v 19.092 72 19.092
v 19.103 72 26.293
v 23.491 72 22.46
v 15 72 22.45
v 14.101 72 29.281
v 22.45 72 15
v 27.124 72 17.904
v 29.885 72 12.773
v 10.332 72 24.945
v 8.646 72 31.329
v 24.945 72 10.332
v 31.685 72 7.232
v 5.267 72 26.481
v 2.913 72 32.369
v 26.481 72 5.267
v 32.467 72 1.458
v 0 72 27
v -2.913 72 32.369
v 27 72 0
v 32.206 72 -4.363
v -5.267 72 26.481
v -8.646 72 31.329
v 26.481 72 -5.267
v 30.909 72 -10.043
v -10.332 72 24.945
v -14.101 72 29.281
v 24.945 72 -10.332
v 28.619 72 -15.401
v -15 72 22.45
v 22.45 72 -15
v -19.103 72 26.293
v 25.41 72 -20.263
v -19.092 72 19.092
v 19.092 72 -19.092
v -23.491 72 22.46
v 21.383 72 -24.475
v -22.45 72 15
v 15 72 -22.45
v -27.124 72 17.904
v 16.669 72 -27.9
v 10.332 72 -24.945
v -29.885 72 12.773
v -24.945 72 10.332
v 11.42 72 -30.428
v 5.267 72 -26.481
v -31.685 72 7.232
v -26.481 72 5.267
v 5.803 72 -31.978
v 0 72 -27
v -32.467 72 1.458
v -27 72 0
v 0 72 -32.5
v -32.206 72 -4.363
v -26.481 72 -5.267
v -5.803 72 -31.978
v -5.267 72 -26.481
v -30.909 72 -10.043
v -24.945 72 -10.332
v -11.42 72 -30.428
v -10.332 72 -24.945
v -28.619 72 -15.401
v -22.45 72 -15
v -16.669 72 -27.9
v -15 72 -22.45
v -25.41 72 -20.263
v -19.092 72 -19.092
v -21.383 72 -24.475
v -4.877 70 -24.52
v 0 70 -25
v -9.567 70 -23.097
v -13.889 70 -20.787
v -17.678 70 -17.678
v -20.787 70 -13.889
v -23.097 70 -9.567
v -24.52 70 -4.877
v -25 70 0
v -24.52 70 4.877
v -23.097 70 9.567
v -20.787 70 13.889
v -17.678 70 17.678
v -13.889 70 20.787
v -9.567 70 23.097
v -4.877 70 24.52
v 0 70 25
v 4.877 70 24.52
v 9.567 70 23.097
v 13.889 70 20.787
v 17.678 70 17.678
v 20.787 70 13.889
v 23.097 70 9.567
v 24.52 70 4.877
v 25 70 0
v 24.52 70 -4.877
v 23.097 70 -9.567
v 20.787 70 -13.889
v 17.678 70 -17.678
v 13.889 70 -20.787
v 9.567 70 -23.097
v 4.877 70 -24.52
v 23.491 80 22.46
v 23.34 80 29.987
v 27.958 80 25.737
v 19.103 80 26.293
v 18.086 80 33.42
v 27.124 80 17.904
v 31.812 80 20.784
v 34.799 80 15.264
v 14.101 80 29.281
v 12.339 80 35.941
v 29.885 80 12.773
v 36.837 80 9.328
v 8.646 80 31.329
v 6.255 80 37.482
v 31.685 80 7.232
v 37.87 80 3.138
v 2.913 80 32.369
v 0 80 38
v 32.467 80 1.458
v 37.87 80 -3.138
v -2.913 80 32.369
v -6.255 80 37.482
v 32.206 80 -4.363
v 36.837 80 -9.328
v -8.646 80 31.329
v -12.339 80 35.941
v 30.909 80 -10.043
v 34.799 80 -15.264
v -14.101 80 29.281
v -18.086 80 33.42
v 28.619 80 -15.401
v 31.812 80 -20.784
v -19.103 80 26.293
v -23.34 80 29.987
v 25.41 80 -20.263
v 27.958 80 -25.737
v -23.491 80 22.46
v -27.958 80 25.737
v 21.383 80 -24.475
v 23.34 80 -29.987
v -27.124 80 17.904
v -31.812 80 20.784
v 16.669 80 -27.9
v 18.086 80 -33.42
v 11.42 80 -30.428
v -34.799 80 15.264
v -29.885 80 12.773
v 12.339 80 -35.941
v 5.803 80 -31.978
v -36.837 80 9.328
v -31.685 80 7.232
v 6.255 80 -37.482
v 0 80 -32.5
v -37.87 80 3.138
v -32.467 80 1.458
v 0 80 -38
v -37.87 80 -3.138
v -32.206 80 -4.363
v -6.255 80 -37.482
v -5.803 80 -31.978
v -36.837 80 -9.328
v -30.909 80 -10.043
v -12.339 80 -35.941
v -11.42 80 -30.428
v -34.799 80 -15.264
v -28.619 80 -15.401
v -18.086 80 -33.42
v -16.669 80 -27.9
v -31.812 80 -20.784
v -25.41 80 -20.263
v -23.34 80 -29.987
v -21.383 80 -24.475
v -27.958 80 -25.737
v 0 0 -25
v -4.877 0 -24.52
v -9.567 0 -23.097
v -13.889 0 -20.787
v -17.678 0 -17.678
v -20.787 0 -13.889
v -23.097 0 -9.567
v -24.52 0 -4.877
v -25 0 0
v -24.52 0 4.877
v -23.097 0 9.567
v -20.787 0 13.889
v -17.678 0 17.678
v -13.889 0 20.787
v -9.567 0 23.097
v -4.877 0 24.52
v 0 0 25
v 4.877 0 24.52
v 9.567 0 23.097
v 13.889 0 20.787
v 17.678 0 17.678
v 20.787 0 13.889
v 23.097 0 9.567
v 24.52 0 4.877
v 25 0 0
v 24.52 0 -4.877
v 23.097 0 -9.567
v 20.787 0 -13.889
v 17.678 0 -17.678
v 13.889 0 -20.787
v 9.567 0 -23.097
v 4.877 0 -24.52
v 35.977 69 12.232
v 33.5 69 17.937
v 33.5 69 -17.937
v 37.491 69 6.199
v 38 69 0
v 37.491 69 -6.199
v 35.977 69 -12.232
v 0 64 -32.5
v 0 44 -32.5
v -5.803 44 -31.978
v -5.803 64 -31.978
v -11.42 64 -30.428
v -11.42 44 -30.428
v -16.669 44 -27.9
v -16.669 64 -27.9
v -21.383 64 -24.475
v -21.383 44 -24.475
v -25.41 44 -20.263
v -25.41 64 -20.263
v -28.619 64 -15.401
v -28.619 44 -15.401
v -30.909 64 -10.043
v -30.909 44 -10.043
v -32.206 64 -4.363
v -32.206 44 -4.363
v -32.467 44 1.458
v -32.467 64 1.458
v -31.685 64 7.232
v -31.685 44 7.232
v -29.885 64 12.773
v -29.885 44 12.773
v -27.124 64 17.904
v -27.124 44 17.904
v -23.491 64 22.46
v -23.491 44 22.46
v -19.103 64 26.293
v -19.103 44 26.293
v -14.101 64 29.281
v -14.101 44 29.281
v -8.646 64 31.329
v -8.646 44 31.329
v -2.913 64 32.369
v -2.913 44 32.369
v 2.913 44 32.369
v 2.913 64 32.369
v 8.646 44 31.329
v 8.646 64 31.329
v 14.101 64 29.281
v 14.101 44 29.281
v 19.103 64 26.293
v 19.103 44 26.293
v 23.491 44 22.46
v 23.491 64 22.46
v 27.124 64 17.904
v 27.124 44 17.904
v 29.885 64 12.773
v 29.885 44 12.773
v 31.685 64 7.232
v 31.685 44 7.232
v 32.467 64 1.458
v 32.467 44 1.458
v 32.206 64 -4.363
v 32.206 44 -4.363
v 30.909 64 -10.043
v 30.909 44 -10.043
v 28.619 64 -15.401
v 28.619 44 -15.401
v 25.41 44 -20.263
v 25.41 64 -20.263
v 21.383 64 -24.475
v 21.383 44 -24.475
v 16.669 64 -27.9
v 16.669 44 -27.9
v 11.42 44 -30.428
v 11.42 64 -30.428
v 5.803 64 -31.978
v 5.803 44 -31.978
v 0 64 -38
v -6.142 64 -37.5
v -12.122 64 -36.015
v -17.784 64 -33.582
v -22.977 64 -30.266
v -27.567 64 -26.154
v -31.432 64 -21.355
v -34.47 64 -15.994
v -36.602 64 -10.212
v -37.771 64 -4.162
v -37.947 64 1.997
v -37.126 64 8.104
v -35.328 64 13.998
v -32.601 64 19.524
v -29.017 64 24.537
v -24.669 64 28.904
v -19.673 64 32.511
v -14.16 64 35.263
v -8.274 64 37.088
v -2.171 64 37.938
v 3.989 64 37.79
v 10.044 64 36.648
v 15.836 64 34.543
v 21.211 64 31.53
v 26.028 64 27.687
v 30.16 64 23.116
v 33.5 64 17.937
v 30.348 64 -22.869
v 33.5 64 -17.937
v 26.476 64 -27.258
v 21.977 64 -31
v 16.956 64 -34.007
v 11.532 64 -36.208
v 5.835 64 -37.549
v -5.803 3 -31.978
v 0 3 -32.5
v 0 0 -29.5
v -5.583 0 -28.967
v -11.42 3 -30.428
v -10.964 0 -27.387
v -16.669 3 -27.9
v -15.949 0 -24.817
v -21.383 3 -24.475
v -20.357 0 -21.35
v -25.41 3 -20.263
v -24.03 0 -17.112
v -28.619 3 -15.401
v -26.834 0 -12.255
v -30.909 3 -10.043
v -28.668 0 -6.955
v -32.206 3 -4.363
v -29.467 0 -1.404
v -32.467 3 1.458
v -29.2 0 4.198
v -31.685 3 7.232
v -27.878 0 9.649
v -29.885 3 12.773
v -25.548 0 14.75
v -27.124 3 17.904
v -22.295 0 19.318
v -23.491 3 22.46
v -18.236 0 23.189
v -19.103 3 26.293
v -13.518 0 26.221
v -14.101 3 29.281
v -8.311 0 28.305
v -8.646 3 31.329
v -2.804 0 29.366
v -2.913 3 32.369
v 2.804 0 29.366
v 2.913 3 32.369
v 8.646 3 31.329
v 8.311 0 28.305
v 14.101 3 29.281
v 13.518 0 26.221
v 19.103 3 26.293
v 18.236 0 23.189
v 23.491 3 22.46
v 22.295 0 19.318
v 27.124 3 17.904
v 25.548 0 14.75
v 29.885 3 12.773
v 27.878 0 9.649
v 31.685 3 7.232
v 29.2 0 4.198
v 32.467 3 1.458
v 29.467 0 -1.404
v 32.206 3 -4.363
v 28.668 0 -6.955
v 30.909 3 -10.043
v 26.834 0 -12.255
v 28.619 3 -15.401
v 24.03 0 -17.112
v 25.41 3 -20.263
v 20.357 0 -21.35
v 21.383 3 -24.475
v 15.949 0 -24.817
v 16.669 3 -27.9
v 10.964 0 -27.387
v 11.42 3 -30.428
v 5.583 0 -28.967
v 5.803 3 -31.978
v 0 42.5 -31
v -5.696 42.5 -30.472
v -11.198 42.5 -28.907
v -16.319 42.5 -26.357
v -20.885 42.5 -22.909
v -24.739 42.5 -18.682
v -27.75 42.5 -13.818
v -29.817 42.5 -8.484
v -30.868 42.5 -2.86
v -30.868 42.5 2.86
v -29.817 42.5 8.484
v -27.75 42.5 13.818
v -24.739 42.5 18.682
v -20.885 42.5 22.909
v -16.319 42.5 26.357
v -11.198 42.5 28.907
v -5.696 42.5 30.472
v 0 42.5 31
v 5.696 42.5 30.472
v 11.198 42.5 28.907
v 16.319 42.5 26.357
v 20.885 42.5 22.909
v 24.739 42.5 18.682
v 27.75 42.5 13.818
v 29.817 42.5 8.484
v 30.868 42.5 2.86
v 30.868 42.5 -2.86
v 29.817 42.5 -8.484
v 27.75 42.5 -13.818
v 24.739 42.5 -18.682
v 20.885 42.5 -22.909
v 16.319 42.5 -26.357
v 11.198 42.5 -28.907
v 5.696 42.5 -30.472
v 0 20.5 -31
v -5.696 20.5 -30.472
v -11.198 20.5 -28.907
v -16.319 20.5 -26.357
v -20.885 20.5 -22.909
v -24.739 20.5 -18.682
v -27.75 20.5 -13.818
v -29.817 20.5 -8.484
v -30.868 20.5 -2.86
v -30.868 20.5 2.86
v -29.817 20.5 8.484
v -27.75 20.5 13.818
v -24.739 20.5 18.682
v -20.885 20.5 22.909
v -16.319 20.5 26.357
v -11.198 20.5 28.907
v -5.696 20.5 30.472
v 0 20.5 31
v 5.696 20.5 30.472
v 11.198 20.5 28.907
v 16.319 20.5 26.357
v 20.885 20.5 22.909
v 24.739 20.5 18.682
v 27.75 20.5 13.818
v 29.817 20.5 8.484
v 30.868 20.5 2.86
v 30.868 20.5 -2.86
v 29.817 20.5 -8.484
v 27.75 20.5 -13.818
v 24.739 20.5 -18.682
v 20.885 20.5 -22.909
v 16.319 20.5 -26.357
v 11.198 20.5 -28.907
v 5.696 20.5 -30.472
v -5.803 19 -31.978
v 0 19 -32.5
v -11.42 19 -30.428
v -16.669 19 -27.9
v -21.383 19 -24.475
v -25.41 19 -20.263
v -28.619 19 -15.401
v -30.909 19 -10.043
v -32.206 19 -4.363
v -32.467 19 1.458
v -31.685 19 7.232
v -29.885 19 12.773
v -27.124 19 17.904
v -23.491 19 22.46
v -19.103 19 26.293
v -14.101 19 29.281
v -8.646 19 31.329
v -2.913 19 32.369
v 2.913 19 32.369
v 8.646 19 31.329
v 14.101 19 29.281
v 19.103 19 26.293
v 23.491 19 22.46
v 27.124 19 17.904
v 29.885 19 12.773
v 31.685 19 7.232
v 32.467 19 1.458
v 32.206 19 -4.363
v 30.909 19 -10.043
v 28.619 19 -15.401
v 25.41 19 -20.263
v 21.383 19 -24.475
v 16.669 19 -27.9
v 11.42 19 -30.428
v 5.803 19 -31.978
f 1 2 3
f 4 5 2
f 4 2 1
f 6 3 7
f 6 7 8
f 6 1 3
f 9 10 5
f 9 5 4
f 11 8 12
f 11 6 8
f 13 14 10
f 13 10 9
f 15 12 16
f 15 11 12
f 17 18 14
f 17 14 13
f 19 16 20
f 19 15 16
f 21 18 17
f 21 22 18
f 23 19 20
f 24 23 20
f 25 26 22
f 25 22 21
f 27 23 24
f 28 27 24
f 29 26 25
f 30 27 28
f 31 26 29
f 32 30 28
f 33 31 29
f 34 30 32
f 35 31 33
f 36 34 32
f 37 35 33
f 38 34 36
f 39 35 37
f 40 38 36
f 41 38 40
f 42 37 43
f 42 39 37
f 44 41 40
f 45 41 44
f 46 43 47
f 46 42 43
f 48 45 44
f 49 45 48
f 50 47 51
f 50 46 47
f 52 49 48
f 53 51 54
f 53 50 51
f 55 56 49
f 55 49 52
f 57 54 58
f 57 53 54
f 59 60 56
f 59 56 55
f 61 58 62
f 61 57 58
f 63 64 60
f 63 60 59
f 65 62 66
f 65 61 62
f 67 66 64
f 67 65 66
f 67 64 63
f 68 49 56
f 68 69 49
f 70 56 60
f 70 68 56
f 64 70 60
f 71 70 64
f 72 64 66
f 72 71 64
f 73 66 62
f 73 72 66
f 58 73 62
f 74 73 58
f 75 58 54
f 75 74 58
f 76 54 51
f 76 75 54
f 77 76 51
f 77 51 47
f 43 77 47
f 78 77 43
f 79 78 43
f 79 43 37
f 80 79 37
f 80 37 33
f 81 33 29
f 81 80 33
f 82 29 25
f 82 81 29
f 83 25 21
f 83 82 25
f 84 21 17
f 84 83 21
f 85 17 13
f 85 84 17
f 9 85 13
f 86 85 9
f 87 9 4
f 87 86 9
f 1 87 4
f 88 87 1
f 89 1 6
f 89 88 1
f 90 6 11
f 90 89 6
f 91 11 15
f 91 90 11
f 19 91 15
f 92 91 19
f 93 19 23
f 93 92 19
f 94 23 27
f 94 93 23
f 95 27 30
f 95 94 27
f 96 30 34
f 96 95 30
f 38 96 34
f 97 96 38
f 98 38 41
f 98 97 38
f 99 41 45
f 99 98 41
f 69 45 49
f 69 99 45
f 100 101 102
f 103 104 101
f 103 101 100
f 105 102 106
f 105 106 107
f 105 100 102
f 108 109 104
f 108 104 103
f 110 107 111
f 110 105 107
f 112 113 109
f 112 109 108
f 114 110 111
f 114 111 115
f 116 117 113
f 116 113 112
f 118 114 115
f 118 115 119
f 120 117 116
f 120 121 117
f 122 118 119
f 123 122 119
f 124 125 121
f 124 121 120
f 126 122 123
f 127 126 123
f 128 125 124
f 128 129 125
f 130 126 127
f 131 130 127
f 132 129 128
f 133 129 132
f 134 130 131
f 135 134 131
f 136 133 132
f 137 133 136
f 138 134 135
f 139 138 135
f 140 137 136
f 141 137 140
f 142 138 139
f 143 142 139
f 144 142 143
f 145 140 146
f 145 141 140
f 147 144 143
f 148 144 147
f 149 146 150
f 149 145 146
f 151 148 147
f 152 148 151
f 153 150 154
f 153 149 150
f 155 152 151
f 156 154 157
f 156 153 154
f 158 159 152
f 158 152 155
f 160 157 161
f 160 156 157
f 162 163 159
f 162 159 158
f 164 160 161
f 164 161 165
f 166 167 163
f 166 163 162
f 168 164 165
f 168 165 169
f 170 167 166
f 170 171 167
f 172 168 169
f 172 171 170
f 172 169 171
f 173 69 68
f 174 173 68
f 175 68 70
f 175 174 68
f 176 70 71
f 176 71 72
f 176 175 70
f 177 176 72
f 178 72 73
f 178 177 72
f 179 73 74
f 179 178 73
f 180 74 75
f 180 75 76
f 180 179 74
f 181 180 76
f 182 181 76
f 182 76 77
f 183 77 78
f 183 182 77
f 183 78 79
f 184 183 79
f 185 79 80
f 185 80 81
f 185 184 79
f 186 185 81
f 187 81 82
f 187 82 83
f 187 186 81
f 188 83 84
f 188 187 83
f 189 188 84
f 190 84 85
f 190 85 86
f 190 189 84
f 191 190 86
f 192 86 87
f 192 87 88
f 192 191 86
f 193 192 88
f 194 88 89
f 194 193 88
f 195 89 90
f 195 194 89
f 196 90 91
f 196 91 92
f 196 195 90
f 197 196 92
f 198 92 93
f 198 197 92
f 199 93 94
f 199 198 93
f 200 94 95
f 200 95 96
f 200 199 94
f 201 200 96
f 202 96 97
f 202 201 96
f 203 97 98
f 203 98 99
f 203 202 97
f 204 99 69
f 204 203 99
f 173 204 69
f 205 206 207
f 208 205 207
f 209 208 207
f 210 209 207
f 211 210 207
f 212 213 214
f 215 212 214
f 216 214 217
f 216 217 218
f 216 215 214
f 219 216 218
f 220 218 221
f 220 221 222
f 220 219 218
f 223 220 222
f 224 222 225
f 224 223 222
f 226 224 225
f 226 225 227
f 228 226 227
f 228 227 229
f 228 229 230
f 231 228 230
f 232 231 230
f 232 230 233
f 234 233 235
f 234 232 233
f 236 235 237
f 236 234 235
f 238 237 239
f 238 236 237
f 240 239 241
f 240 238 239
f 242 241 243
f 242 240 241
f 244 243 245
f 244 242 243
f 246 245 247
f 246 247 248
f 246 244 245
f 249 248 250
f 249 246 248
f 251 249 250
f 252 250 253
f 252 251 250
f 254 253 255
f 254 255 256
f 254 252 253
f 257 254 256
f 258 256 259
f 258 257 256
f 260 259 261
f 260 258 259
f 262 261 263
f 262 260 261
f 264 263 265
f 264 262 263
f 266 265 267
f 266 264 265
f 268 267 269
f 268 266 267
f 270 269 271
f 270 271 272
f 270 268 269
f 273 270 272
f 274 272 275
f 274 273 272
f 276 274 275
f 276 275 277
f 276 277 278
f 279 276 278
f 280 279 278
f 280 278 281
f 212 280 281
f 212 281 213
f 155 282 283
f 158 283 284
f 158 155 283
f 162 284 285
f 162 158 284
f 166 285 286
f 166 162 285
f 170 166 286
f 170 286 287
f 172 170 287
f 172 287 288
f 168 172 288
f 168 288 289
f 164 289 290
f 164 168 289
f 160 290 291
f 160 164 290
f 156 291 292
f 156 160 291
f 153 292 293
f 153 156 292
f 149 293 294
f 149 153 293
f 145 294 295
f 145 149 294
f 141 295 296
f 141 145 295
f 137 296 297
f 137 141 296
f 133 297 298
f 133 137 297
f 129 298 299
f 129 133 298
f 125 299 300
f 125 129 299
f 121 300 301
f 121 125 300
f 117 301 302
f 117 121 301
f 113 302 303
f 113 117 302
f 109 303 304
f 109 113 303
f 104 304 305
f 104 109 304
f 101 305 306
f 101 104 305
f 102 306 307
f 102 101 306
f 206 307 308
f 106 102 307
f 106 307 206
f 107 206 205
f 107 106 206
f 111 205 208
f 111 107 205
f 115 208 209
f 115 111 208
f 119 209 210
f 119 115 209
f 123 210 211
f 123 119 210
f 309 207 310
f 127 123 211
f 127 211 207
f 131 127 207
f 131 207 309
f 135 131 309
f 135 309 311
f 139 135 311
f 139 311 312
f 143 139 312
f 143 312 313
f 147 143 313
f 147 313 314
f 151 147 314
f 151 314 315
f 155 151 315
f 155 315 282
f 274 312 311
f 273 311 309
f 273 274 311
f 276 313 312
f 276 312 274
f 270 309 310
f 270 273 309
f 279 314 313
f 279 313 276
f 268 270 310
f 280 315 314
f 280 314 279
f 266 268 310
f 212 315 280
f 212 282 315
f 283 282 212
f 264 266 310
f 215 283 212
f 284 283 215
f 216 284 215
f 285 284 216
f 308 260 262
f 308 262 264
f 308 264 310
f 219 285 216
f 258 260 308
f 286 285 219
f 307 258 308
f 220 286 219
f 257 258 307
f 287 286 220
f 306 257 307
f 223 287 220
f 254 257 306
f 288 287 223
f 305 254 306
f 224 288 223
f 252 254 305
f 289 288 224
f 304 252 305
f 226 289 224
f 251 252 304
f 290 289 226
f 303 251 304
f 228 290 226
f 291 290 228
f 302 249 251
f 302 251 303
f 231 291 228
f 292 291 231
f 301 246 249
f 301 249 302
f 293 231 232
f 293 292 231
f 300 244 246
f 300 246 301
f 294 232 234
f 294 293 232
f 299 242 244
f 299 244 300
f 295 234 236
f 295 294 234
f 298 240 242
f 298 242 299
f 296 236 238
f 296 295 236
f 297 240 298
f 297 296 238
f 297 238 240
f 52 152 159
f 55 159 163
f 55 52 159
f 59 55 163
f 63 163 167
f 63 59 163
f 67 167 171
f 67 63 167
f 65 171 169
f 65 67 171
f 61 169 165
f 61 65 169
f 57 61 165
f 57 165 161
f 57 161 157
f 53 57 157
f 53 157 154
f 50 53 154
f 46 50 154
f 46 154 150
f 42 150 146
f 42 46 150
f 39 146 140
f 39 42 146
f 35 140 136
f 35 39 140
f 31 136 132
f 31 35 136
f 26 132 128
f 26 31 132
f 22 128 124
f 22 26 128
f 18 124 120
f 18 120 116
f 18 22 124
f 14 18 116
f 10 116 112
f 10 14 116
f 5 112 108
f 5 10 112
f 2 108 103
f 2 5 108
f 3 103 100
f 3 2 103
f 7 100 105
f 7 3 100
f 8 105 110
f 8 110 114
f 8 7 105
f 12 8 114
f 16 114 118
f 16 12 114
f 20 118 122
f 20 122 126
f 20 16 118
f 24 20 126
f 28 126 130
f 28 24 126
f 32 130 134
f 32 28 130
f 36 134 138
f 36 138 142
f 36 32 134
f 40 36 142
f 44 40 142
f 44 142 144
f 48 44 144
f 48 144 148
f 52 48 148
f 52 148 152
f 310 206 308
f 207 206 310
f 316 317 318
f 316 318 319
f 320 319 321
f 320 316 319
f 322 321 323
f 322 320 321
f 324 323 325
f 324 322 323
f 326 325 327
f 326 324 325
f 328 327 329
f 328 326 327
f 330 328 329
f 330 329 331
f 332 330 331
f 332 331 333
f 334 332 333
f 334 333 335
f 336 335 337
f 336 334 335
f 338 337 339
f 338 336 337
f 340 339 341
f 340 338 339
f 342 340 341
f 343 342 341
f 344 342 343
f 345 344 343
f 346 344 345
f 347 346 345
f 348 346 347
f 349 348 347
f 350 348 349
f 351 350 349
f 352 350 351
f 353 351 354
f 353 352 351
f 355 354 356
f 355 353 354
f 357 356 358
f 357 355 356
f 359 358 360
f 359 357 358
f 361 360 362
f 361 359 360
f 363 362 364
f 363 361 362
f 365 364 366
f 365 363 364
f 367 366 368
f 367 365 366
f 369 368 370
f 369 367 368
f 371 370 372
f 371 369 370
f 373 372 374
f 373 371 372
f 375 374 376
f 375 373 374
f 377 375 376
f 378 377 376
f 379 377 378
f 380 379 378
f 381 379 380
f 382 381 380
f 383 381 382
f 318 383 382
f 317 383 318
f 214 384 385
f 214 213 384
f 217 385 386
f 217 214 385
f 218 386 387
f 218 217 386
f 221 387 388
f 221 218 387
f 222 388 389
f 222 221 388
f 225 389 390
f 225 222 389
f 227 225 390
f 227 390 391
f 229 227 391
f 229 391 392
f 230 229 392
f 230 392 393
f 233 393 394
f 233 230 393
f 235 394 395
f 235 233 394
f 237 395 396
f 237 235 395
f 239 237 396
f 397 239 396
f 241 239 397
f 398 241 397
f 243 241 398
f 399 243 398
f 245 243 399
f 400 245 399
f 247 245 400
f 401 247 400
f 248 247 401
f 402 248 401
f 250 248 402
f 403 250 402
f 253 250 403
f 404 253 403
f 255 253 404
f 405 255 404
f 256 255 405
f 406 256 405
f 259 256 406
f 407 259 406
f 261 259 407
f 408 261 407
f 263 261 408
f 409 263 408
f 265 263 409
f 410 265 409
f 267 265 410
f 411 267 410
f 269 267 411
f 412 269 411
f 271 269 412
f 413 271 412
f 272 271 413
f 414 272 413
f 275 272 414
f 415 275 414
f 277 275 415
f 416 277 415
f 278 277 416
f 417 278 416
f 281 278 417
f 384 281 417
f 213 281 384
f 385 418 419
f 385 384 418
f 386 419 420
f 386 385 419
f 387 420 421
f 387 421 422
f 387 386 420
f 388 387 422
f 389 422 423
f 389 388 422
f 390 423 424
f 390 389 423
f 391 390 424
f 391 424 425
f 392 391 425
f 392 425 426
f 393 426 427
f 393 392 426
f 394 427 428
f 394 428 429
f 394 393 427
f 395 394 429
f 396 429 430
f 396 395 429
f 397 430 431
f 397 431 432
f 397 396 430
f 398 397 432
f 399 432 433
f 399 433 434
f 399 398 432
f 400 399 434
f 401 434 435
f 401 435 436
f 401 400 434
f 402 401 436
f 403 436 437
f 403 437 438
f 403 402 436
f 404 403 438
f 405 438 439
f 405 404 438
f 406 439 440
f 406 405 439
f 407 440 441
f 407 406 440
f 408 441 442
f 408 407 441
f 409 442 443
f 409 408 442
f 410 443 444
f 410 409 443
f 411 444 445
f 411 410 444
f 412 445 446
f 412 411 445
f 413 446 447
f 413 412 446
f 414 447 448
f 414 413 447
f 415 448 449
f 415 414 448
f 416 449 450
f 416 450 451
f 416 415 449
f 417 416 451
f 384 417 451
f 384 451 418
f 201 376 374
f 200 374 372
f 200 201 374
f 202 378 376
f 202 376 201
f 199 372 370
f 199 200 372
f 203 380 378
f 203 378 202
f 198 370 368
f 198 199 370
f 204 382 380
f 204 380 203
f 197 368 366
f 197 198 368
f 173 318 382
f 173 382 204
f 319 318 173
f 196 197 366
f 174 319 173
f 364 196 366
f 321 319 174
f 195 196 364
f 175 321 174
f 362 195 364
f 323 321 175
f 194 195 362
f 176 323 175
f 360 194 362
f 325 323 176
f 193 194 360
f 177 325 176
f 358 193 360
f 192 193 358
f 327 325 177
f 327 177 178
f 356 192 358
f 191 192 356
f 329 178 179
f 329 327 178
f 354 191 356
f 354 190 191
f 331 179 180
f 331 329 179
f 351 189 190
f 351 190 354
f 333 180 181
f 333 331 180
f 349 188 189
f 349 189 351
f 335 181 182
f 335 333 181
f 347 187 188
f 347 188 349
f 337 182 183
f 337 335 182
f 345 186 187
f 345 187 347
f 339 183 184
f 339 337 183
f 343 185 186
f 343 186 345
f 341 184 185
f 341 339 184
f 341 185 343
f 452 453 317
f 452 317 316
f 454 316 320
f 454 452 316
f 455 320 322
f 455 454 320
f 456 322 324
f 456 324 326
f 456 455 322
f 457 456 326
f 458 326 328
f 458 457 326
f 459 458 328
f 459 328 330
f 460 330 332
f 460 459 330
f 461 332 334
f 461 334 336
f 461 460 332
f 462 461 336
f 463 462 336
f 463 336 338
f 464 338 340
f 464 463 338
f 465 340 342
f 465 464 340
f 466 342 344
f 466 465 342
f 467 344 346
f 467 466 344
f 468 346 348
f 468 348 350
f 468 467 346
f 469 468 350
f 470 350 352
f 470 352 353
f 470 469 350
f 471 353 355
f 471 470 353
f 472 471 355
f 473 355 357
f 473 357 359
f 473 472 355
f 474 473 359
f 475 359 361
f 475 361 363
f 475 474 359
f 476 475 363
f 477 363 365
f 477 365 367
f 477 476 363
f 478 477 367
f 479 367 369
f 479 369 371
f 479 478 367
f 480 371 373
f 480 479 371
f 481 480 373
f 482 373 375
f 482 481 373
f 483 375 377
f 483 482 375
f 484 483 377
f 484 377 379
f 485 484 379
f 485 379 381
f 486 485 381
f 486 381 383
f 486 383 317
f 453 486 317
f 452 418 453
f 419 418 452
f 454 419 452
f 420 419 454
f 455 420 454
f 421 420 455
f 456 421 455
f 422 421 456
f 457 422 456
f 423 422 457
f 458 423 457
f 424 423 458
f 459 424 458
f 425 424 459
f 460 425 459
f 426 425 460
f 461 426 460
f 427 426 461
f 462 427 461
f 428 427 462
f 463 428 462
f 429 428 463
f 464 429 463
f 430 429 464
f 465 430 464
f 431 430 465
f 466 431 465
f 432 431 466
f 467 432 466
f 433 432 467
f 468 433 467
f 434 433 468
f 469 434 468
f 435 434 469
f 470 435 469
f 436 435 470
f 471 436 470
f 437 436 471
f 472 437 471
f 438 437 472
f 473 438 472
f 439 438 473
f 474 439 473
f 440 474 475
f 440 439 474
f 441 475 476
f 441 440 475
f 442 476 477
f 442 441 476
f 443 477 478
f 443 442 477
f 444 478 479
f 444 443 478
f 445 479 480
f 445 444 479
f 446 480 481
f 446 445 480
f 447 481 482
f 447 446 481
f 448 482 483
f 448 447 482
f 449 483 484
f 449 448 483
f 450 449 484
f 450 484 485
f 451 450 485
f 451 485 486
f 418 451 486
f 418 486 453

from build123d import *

# Parameters (mm, degrees)
CUT_EXTRUDE1_START = -11
SKETCH2_W          = 20.025201173
SKETCH2_H          = 73.268677232
CUT_EXTRUDE1_DEPTH = 86.374270425
CHAMFER1_SIZE      = 3


with BuildPart() as part:
    # Sketch1 → Revolve1 (revolve)
    with BuildSketch(Plane.XY, mode=Mode.PRIVATE) as revolve1_sk:
        Polygon((-32.5, 80), (-32.5, 72), (-27, 72), (-25, 70), (-25, 0), (-32.5, 0), (-32.5, 19), (-31, 20.5), (-31, 42.5), (-32.5, 44), (-32.5, 64), (-38, 64), (-38, 80), align=None)
    revolve(revolve1_sk.sketch.rotate(Axis((0, 0, 0), (0, 1, 0)), 270), axis=Axis((0, 0, 0), (0, 1, 0)))

    # Sketch2 → Cut-Extrude1 (cut, through all)
    with BuildSketch(Plane(origin=(0, 80, 0), x_dir=(1, 0, 0), z_dir=(0, 1, 0)).offset(CUT_EXTRUDE1_START)):
        with Locations((43.512600586, -0.824567107)):
            Rectangle(SKETCH2_W, SKETCH2_H)
    extrude(amount=-CUT_EXTRUDE1_DEPTH, mode=Mode.SUBTRACT)

    # Chamfer1
    chamfer1_edges = [part.edges().sort_by_distance(p)[0] for p in [
        (0, 0, 32.5),
    ]]
    chamfer(chamfer1_edges, length=CHAMFER1_SIZE)


solid = part.part
